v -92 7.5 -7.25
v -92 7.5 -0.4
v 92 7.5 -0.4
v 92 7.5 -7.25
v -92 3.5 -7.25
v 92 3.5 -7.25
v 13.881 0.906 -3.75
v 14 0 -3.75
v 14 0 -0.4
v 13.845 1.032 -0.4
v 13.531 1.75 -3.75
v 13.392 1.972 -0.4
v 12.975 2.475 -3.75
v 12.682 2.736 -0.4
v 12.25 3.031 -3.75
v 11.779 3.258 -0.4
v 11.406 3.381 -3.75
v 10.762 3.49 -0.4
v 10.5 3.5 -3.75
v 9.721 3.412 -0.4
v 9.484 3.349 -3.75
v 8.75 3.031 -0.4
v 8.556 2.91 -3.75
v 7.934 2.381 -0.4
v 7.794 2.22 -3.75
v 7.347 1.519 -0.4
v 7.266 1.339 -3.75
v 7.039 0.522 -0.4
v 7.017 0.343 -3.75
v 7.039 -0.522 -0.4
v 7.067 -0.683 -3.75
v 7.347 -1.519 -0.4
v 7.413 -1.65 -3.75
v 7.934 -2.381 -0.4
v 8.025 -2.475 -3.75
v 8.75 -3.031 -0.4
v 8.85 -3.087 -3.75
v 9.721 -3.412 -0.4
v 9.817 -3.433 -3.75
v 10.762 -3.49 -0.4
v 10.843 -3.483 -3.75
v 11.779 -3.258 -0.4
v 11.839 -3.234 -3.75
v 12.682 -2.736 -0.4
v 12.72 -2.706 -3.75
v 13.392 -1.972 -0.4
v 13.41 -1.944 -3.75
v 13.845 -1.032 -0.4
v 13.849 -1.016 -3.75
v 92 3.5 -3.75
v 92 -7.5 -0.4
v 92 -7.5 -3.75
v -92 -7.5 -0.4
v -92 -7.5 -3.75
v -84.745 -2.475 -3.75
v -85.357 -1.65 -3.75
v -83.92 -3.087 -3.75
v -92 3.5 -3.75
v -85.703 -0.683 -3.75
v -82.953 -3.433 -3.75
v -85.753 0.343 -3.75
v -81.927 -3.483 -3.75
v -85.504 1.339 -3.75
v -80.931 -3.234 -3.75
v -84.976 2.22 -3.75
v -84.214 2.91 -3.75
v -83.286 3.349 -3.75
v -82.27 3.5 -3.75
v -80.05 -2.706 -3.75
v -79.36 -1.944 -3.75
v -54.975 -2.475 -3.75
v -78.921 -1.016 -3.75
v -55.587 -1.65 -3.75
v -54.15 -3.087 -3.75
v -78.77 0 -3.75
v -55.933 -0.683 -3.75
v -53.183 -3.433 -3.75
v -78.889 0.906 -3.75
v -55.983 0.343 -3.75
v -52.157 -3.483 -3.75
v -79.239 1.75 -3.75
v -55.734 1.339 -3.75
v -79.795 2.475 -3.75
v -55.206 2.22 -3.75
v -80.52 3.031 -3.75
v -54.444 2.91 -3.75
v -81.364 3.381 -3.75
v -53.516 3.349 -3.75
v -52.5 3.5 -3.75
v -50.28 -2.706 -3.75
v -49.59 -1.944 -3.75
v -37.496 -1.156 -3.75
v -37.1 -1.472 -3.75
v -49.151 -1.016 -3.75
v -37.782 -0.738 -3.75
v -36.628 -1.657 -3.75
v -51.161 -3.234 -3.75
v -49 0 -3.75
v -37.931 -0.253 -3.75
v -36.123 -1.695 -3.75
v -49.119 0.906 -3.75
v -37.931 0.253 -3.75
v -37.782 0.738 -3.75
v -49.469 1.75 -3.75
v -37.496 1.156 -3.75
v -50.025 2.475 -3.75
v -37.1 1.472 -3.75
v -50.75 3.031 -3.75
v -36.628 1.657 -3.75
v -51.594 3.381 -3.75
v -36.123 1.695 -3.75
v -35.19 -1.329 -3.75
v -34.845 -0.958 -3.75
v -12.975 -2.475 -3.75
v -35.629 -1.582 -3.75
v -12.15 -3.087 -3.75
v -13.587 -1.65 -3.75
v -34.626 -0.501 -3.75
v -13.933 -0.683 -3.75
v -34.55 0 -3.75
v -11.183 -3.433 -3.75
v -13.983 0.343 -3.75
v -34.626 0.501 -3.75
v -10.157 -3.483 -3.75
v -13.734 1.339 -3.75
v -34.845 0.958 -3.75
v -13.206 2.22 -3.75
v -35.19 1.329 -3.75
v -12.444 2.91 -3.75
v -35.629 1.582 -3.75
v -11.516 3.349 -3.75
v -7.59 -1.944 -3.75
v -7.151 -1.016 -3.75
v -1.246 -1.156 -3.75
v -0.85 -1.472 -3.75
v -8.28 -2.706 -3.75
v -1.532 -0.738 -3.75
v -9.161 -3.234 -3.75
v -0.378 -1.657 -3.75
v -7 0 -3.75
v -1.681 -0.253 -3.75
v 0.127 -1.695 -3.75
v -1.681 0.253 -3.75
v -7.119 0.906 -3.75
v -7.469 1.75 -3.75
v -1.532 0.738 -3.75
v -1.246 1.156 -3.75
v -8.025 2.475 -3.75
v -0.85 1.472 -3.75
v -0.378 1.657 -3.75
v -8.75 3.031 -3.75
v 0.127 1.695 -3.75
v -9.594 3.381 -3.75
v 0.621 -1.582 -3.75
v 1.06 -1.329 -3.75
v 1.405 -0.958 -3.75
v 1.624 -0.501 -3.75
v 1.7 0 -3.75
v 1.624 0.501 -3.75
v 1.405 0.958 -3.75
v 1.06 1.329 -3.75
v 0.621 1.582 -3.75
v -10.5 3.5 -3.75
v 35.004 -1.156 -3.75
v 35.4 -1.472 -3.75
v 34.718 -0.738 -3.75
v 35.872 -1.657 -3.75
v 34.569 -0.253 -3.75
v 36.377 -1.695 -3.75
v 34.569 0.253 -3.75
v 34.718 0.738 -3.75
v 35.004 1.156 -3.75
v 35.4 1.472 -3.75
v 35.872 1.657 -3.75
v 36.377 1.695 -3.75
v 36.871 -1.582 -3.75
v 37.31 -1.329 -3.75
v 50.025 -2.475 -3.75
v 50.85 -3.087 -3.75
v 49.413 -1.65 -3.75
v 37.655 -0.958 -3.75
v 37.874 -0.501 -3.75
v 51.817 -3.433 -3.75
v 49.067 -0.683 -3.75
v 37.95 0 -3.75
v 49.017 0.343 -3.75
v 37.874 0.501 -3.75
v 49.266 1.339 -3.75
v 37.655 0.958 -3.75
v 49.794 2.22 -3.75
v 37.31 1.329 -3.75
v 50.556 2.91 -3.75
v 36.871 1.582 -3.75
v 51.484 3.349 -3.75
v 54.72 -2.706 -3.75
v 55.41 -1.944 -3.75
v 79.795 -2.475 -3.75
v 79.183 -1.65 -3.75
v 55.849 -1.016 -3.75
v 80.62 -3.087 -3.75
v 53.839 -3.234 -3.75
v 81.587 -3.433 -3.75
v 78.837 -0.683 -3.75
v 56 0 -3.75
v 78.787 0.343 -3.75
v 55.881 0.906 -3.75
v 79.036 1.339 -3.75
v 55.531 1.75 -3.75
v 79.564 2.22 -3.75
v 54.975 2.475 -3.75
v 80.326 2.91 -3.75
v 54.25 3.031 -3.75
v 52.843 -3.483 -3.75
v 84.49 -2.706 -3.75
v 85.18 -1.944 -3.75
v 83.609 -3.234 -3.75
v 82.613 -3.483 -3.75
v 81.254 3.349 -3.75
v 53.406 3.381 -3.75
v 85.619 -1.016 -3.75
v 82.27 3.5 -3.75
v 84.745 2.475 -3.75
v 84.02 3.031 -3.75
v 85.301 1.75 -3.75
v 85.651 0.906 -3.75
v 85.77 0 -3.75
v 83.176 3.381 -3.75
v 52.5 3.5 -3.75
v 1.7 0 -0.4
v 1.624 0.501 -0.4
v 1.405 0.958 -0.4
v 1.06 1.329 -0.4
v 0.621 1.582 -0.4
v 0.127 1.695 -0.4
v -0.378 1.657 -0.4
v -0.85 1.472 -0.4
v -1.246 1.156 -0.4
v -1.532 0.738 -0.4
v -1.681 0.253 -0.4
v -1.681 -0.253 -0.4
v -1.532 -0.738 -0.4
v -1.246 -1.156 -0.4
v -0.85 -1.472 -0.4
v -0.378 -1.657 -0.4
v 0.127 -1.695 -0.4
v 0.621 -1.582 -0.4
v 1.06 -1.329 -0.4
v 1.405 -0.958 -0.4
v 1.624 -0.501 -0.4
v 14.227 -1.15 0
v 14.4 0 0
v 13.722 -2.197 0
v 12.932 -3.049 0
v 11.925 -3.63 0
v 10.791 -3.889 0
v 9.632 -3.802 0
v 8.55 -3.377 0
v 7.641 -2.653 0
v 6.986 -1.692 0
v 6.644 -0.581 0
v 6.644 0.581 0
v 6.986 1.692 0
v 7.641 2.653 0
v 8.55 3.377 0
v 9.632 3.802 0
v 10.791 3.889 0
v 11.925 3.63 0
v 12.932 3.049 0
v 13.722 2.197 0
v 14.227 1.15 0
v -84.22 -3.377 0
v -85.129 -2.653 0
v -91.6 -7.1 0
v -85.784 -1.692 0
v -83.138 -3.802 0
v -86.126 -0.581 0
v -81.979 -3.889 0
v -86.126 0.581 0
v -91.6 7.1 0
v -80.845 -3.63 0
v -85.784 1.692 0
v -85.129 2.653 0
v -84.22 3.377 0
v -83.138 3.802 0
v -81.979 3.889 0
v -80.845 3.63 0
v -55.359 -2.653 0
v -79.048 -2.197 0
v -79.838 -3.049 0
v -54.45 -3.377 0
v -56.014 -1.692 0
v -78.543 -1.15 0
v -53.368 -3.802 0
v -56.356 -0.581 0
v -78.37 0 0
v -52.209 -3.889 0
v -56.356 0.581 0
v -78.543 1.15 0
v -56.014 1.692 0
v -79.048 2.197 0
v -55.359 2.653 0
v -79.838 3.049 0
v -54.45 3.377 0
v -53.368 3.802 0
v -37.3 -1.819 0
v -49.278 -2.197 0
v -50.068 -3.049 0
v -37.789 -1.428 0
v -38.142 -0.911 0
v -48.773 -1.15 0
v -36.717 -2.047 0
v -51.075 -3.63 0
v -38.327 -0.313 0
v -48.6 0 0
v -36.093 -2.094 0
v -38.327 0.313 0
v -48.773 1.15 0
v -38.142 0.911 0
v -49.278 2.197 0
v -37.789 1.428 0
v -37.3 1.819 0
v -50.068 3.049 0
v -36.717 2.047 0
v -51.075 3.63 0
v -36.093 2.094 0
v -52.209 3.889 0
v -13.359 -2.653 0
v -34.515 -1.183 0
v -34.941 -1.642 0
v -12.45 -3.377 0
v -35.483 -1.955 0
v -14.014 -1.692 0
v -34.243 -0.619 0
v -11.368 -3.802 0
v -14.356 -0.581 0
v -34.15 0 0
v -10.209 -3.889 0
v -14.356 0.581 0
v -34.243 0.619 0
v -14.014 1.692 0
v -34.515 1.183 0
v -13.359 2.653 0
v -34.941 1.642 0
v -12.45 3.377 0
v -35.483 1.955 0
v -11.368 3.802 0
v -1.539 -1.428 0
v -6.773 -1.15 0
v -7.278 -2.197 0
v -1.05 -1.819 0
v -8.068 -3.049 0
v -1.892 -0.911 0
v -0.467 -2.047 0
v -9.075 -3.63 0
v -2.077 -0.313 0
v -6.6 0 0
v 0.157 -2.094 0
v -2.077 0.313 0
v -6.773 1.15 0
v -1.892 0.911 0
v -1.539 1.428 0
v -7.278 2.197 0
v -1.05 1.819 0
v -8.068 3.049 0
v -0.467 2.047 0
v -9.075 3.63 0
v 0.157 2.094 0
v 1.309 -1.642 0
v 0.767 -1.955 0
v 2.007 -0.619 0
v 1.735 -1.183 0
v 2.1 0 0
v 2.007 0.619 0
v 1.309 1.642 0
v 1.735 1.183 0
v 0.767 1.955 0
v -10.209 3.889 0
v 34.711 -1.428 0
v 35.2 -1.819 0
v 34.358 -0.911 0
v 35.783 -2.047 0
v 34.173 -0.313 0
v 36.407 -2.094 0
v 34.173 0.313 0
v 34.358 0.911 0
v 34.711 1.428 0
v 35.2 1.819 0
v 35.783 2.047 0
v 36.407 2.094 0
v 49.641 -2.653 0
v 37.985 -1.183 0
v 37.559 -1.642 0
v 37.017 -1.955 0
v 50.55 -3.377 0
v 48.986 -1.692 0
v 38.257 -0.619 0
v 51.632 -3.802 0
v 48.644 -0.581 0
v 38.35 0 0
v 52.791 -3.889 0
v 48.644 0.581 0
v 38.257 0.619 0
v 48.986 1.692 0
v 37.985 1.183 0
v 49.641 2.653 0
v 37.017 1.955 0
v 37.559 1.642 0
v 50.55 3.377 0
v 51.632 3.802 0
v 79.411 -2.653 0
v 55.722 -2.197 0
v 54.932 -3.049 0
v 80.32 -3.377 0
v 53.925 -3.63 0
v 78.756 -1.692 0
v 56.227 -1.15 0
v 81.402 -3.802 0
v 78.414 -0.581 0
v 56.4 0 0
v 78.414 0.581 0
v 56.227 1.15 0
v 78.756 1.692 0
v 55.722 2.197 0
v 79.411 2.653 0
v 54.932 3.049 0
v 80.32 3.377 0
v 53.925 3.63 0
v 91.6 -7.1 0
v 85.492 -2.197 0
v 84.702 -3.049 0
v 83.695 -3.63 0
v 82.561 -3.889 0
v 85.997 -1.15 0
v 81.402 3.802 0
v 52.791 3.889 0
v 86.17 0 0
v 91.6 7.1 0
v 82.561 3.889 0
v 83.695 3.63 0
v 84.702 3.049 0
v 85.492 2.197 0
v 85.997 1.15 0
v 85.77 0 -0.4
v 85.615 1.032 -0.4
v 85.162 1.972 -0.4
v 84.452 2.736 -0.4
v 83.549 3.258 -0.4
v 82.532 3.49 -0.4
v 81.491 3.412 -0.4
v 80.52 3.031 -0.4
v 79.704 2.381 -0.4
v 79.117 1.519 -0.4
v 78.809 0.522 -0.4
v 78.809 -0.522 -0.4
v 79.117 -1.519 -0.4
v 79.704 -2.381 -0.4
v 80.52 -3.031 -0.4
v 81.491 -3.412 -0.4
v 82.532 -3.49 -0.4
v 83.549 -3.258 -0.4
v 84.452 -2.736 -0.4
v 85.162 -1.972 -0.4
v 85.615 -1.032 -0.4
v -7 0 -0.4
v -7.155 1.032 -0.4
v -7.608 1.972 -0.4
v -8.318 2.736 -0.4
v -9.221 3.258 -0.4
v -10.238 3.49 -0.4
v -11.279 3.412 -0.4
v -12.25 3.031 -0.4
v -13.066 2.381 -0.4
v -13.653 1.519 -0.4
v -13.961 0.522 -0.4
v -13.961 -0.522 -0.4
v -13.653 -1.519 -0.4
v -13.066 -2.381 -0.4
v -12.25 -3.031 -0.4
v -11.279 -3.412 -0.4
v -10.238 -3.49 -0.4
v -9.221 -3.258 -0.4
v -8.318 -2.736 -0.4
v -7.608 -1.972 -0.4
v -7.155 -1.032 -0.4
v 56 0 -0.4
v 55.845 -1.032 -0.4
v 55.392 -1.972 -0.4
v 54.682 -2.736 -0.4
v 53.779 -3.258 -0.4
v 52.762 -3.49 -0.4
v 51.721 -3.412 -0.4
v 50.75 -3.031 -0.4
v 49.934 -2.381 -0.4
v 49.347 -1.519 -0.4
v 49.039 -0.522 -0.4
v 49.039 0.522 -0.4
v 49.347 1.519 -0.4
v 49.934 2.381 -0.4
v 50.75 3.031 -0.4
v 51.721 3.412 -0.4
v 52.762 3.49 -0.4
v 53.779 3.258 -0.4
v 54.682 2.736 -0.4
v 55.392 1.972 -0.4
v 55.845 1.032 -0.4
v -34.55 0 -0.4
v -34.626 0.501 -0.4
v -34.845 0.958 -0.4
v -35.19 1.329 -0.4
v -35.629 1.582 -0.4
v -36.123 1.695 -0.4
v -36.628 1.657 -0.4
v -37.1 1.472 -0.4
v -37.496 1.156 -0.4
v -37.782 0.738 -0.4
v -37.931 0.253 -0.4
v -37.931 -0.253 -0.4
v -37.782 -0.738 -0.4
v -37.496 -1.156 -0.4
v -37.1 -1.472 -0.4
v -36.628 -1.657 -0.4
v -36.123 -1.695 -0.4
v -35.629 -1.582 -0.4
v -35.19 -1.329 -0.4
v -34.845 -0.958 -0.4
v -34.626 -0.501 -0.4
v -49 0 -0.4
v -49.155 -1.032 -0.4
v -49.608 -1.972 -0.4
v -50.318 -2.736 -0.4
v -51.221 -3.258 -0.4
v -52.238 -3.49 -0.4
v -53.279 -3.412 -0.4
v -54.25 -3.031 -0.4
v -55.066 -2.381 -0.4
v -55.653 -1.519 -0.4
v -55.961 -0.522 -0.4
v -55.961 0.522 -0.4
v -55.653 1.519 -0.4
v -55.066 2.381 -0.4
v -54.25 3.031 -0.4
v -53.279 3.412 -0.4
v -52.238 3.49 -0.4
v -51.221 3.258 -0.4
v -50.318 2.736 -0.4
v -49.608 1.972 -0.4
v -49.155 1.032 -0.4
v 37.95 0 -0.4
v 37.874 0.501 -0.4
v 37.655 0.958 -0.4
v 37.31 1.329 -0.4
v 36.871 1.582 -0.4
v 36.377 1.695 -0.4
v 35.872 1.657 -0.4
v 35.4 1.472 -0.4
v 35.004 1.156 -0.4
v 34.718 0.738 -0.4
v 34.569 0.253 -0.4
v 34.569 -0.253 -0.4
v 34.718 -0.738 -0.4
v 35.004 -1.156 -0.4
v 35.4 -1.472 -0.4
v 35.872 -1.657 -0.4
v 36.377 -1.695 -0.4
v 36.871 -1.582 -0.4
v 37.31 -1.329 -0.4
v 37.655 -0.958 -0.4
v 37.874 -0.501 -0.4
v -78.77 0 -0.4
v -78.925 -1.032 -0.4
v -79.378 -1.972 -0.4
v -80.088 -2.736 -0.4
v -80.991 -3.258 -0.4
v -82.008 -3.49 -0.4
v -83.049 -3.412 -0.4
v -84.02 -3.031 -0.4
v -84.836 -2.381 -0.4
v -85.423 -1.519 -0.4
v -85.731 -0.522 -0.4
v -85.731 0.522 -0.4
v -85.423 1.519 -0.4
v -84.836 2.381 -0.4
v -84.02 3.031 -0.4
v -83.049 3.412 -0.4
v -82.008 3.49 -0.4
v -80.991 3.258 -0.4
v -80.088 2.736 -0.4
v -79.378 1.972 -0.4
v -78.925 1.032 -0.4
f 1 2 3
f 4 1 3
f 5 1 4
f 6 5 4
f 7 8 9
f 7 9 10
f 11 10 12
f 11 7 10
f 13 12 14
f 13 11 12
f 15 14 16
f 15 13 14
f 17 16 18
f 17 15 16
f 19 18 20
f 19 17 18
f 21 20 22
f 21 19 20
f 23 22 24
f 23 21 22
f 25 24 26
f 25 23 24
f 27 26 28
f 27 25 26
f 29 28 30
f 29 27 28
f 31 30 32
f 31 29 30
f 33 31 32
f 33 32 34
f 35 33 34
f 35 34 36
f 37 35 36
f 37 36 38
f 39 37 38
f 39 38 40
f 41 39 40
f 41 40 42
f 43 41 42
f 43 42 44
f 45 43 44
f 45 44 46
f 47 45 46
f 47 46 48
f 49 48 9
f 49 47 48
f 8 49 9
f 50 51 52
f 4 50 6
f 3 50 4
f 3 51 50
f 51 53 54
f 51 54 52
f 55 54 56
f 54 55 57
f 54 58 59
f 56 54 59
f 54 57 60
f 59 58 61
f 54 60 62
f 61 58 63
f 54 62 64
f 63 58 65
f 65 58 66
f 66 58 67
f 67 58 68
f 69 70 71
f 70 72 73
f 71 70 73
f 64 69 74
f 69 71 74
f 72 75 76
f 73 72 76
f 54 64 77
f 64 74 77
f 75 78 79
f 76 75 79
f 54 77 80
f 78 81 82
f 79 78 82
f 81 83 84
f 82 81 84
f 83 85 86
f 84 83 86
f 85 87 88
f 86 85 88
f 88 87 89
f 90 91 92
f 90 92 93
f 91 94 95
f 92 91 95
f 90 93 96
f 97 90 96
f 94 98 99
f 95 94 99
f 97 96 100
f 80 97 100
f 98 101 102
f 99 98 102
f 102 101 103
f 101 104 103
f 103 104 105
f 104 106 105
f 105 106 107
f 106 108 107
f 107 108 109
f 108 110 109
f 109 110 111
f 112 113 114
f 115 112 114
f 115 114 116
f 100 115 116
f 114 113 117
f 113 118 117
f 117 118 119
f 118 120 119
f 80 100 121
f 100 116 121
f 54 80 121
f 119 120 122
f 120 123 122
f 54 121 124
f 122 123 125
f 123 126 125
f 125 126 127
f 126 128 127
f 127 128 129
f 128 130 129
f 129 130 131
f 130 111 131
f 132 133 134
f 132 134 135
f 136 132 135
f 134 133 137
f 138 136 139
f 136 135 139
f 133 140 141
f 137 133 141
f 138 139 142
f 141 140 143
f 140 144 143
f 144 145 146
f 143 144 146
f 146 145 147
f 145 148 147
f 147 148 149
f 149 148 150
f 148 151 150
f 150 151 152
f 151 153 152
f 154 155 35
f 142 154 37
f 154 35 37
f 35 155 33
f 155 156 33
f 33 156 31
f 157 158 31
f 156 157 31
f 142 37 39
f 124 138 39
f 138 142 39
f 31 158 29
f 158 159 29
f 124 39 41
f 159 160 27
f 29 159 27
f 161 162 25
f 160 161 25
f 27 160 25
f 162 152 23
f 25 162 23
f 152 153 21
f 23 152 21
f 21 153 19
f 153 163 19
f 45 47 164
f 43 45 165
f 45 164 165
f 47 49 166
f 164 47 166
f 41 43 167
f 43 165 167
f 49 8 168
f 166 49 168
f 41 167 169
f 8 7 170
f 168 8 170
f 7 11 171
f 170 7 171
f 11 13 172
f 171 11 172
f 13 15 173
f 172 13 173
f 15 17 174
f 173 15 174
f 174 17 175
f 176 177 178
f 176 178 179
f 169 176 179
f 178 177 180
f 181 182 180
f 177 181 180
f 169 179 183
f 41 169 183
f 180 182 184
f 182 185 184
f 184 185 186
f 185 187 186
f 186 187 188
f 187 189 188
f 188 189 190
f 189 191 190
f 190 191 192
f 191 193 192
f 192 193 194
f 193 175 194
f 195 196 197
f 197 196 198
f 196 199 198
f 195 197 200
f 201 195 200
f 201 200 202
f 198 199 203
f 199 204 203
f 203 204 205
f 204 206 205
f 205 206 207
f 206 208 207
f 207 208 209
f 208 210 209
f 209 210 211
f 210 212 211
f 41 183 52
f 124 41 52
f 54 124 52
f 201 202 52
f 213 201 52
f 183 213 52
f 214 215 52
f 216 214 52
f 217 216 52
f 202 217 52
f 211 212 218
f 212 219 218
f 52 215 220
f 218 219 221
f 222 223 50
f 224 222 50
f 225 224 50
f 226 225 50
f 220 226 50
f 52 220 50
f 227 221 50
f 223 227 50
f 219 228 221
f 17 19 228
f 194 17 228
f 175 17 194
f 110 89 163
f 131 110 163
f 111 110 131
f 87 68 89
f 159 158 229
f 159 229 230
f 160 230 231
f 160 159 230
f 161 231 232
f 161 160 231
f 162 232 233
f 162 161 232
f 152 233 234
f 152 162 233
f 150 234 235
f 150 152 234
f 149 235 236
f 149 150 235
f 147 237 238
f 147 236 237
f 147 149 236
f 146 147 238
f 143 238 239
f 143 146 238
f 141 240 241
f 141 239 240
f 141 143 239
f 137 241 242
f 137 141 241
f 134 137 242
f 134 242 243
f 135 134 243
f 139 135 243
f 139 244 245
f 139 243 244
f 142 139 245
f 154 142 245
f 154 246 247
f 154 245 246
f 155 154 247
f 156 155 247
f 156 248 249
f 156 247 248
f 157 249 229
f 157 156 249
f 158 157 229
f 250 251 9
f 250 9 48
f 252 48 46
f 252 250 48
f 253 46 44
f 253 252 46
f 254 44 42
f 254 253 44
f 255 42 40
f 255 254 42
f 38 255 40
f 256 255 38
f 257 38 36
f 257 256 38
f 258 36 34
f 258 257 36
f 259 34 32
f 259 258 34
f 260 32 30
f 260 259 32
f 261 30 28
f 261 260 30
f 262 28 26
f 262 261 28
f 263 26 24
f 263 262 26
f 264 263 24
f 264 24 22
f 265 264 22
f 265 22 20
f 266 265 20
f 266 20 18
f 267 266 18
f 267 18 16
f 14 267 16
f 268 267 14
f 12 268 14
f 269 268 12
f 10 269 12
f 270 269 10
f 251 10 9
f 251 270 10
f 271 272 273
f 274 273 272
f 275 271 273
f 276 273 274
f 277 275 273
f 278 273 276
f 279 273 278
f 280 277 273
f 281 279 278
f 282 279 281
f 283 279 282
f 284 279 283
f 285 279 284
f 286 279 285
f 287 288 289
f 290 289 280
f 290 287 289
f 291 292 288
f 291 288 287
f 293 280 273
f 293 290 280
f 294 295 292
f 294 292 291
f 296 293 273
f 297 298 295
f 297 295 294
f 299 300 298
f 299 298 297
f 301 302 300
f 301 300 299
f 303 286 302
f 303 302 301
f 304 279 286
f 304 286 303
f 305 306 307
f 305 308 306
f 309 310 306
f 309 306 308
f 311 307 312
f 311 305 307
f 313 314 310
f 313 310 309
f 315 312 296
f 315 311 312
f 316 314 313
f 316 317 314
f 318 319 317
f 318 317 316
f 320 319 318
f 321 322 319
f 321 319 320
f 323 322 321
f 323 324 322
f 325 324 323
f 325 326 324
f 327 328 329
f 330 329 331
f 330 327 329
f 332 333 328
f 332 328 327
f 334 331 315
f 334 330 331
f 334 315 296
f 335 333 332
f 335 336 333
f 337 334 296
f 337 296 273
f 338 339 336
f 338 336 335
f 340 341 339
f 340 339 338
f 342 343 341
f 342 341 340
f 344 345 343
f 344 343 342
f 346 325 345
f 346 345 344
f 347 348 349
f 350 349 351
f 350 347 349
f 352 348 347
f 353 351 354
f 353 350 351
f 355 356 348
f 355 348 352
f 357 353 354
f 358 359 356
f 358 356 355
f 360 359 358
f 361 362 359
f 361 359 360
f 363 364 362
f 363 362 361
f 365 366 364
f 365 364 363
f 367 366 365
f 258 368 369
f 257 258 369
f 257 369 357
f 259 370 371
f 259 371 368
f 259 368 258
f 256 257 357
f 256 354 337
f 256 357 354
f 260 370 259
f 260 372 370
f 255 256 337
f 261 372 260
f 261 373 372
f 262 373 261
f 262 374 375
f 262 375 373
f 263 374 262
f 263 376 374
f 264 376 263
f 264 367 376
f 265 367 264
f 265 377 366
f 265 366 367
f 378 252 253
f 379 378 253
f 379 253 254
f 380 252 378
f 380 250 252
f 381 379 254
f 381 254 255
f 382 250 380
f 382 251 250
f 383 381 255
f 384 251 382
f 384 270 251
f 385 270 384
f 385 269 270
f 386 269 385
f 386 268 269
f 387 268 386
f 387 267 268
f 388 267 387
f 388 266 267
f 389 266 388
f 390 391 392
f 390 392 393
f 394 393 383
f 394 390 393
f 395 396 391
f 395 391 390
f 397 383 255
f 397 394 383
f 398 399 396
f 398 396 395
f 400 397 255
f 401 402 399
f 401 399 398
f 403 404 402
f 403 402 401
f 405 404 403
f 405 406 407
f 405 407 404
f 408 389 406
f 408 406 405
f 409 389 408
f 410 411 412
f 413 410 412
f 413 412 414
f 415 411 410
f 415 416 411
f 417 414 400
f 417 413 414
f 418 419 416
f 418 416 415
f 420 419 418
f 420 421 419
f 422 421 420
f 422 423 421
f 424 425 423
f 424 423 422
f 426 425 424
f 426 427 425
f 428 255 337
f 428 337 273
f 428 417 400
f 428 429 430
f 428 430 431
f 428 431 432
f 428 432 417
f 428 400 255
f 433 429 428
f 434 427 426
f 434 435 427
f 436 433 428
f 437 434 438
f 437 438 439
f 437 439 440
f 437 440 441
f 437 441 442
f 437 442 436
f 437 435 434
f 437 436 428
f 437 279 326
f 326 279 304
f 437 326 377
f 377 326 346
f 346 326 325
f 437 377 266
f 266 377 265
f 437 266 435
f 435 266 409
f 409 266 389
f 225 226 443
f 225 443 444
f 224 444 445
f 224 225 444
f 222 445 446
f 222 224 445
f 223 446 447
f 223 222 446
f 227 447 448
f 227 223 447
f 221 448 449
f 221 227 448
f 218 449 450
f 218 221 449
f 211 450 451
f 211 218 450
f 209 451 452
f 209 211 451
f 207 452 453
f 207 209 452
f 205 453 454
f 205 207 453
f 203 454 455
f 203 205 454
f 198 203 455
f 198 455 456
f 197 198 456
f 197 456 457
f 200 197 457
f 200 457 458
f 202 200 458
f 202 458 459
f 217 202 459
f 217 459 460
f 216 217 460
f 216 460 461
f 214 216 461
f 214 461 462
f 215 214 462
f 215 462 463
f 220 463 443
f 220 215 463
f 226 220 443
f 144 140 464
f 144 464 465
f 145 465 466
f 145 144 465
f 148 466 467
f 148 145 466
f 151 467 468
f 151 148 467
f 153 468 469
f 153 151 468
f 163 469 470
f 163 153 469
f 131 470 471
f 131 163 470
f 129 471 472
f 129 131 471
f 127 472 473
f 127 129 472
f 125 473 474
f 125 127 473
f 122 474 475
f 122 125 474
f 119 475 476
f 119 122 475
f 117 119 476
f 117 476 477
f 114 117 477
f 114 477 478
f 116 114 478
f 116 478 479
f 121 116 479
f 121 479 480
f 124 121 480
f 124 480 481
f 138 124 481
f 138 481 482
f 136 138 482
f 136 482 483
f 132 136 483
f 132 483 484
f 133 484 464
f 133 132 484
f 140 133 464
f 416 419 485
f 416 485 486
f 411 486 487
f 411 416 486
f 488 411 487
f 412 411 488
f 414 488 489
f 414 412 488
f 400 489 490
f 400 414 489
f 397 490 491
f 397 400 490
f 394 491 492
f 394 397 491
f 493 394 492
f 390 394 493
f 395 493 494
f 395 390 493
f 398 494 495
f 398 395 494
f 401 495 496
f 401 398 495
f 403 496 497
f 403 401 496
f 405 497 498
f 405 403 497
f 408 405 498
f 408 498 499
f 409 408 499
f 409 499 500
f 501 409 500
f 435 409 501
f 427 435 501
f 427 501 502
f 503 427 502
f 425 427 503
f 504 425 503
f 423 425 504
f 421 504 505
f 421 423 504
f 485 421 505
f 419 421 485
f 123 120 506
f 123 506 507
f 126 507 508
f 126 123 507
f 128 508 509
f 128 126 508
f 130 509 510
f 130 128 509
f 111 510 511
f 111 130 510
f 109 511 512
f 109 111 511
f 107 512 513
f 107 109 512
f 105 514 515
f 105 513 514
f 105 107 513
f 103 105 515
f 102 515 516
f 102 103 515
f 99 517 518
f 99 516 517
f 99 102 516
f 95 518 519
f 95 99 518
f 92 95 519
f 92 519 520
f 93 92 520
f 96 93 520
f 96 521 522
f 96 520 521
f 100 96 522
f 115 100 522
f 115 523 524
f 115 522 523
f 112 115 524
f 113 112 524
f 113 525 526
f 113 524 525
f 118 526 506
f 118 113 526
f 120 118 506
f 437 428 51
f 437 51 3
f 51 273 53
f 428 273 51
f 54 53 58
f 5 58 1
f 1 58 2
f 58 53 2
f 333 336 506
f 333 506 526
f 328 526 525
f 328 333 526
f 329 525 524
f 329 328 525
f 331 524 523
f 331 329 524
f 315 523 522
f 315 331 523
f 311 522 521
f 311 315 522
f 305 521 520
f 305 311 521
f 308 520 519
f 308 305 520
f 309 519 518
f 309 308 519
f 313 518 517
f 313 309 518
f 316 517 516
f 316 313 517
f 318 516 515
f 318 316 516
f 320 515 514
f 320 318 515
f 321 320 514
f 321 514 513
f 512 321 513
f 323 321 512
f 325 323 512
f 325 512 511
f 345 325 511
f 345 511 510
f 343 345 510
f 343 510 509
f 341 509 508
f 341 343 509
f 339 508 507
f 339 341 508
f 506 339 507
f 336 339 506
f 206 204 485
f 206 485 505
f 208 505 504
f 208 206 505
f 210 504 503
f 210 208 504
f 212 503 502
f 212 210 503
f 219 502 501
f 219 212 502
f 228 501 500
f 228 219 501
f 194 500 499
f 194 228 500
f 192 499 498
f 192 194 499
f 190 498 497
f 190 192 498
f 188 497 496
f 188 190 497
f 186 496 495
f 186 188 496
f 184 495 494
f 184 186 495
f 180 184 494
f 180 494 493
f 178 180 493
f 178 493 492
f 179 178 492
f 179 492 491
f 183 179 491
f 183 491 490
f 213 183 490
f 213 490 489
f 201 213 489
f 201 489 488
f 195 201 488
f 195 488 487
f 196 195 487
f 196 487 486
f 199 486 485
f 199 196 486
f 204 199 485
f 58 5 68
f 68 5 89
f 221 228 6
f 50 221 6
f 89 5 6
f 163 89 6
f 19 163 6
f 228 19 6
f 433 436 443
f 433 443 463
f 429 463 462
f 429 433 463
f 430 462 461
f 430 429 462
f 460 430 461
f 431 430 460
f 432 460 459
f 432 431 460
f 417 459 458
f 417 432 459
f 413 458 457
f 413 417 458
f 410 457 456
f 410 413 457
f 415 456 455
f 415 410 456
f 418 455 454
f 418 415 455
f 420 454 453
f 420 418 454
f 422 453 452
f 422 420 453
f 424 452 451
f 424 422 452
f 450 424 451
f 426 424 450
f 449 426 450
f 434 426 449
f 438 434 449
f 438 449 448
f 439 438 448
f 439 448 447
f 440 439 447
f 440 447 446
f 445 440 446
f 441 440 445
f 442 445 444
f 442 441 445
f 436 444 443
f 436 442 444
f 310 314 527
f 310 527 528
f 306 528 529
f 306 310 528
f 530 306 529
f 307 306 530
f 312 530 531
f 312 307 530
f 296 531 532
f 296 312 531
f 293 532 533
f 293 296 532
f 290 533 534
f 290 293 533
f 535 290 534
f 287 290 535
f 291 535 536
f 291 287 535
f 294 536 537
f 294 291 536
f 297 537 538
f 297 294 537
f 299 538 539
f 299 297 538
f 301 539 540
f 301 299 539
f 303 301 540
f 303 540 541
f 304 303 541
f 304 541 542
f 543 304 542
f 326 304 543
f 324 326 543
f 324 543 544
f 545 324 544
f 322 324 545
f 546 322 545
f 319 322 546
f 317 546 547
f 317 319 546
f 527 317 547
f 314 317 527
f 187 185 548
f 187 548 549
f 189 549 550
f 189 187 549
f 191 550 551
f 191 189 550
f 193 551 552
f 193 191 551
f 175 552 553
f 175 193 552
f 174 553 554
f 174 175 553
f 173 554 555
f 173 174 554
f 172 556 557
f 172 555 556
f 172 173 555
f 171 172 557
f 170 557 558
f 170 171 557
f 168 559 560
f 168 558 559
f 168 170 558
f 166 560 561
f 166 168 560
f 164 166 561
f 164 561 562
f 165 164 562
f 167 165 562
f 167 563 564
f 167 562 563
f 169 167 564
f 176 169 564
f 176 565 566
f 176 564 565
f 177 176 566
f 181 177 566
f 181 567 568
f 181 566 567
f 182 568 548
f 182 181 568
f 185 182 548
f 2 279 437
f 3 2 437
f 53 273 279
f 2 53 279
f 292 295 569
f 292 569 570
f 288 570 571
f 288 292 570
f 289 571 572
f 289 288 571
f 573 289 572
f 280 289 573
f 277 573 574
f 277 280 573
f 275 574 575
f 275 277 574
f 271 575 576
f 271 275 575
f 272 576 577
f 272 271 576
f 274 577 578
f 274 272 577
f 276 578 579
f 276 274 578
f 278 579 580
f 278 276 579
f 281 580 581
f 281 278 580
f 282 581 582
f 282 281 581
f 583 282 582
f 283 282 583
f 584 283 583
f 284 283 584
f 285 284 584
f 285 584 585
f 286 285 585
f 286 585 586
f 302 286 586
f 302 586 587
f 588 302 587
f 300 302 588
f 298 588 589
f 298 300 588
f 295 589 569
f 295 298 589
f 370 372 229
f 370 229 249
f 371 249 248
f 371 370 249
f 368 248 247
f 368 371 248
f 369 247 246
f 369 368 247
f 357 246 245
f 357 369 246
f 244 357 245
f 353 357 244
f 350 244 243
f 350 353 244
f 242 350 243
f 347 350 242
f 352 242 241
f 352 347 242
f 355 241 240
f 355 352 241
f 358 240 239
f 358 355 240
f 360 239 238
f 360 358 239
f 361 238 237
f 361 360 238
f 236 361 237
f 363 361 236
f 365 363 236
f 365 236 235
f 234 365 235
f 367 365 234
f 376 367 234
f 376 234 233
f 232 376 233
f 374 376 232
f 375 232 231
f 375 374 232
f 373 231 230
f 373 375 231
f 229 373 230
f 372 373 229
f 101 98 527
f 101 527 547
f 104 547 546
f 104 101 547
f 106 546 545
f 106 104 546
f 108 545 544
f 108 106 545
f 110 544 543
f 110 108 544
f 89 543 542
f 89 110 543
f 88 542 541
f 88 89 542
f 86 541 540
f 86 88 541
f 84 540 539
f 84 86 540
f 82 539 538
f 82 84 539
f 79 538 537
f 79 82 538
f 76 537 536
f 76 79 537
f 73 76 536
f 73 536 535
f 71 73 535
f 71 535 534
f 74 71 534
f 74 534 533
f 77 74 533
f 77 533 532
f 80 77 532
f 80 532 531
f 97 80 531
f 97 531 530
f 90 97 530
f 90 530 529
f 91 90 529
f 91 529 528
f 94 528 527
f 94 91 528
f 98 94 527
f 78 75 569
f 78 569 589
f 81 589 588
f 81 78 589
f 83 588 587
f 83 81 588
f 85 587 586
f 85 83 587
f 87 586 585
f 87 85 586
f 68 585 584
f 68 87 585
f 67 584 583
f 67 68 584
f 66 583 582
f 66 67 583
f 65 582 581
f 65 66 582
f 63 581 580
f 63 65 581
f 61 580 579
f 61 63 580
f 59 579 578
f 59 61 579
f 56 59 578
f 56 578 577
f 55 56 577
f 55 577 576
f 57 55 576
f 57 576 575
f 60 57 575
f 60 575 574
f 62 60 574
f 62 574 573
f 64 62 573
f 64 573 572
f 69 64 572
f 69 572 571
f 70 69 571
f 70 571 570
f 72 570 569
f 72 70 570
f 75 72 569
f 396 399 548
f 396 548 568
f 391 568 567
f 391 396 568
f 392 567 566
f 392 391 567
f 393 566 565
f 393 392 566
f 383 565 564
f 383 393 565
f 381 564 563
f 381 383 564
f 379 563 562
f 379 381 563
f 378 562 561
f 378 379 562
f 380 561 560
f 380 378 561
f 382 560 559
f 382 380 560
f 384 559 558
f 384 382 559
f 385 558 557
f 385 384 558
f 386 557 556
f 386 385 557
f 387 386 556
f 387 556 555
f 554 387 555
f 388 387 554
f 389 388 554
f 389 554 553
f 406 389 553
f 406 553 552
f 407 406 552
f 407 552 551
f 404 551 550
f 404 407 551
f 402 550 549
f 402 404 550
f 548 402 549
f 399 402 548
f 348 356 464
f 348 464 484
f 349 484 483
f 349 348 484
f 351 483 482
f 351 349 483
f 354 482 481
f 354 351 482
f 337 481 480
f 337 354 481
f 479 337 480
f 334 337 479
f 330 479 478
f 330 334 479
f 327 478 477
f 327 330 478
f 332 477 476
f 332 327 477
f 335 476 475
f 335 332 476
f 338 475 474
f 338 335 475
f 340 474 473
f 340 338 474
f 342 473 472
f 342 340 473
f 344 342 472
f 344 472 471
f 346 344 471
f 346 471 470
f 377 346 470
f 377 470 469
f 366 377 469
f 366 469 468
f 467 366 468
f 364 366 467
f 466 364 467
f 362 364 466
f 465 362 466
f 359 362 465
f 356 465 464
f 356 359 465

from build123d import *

# Parameters (mm, degrees)
SKETCH1_W               = 184
SKETCH1_H               = 15
BOSS_EXTRUDE1_DEPTH     = 7.25
CUT_EXTRUDE1_START      = -7.25
SKETCH1_6_W             = 184
SKETCH1_6_H             = 11
CUT_EXTRUDE1_DEPTH      = 3.5
CUT_EXTRUDE2_DEPTH      = 93.589483744
CUT_EXTRUDE2_DEPTH_BACK = 93.589483744
SKETCH2_R               = 3.5
SKETCH2_R_2             = 1.7
CHAMFER1_SIZE           = 0.4


with BuildPart() as part:
    # Sketch1 → Boss-Extrude1 (new body)
    with BuildSketch(Plane.XY):
        Rectangle(SKETCH1_W, SKETCH1_H)
    extrude(amount=-BOSS_EXTRUDE1_DEPTH)

    # Sketch1<6> → Cut-Extrude1 (cut)
    with BuildSketch(Plane.XY.offset(CUT_EXTRUDE1_START)):
        with Locations((0, -2)):
            Rectangle(SKETCH1_6_W, SKETCH1_6_H)
    extrude(amount=CUT_EXTRUDE1_DEPTH, mode=Mode.SUBTRACT)

    # Sketch2 → Cut-Extrude2 (cut, two sides: drawn at the far end of the back side and taken through both)
    with BuildSketch(Plane.XY.offset(-CUT_EXTRUDE2_DEPTH_BACK)):
        with Locations((-52.5, 0)):
            Circle(SKETCH2_R)
        with Locations((-36.25, 0)):
            Circle(SKETCH2_R_2)
        with Locations((-10.5, 0)):
            Circle(SKETCH2_R)
        Circle(SKETCH2_R_2)
        with Locations((10.5, 0)):
            Circle(SKETCH2_R)
        with Locations((36.25, 0)):
            Circle(SKETCH2_R_2)
        with Locations((52.5, 0)):
            Circle(SKETCH2_R)
        with Locations((-82.27, 0)):
            Circle(SKETCH2_R)
        with Locations((82.27, 0)):
            Circle(SKETCH2_R)
    extrude(amount=CUT_EXTRUDE2_DEPTH + CUT_EXTRUDE2_DEPTH_BACK, mode=Mode.SUBTRACT)

    # Chamfer1
    chamfer1_edges = [part.edges().sort_by_distance(p)[0] for p in [
        (-37.95, 0, 0),
        (-14, 0, 0),
        (-1.7, 0, 0),
        (7, 0, 0),
        (0, -7.5, 0),
        (78.77, 0, 0),
        (-92, 0, 0),
        (-85.77, 0, 0),
        (49, 0, 0),
        (34.55, 0, 0),
        (0, 7.5, 0),
        (-56, 0, 0),
        (92, 0, 0),
    ]]
    chamfer(chamfer1_edges, length=CHAMFER1_SIZE)


solid = part.part
